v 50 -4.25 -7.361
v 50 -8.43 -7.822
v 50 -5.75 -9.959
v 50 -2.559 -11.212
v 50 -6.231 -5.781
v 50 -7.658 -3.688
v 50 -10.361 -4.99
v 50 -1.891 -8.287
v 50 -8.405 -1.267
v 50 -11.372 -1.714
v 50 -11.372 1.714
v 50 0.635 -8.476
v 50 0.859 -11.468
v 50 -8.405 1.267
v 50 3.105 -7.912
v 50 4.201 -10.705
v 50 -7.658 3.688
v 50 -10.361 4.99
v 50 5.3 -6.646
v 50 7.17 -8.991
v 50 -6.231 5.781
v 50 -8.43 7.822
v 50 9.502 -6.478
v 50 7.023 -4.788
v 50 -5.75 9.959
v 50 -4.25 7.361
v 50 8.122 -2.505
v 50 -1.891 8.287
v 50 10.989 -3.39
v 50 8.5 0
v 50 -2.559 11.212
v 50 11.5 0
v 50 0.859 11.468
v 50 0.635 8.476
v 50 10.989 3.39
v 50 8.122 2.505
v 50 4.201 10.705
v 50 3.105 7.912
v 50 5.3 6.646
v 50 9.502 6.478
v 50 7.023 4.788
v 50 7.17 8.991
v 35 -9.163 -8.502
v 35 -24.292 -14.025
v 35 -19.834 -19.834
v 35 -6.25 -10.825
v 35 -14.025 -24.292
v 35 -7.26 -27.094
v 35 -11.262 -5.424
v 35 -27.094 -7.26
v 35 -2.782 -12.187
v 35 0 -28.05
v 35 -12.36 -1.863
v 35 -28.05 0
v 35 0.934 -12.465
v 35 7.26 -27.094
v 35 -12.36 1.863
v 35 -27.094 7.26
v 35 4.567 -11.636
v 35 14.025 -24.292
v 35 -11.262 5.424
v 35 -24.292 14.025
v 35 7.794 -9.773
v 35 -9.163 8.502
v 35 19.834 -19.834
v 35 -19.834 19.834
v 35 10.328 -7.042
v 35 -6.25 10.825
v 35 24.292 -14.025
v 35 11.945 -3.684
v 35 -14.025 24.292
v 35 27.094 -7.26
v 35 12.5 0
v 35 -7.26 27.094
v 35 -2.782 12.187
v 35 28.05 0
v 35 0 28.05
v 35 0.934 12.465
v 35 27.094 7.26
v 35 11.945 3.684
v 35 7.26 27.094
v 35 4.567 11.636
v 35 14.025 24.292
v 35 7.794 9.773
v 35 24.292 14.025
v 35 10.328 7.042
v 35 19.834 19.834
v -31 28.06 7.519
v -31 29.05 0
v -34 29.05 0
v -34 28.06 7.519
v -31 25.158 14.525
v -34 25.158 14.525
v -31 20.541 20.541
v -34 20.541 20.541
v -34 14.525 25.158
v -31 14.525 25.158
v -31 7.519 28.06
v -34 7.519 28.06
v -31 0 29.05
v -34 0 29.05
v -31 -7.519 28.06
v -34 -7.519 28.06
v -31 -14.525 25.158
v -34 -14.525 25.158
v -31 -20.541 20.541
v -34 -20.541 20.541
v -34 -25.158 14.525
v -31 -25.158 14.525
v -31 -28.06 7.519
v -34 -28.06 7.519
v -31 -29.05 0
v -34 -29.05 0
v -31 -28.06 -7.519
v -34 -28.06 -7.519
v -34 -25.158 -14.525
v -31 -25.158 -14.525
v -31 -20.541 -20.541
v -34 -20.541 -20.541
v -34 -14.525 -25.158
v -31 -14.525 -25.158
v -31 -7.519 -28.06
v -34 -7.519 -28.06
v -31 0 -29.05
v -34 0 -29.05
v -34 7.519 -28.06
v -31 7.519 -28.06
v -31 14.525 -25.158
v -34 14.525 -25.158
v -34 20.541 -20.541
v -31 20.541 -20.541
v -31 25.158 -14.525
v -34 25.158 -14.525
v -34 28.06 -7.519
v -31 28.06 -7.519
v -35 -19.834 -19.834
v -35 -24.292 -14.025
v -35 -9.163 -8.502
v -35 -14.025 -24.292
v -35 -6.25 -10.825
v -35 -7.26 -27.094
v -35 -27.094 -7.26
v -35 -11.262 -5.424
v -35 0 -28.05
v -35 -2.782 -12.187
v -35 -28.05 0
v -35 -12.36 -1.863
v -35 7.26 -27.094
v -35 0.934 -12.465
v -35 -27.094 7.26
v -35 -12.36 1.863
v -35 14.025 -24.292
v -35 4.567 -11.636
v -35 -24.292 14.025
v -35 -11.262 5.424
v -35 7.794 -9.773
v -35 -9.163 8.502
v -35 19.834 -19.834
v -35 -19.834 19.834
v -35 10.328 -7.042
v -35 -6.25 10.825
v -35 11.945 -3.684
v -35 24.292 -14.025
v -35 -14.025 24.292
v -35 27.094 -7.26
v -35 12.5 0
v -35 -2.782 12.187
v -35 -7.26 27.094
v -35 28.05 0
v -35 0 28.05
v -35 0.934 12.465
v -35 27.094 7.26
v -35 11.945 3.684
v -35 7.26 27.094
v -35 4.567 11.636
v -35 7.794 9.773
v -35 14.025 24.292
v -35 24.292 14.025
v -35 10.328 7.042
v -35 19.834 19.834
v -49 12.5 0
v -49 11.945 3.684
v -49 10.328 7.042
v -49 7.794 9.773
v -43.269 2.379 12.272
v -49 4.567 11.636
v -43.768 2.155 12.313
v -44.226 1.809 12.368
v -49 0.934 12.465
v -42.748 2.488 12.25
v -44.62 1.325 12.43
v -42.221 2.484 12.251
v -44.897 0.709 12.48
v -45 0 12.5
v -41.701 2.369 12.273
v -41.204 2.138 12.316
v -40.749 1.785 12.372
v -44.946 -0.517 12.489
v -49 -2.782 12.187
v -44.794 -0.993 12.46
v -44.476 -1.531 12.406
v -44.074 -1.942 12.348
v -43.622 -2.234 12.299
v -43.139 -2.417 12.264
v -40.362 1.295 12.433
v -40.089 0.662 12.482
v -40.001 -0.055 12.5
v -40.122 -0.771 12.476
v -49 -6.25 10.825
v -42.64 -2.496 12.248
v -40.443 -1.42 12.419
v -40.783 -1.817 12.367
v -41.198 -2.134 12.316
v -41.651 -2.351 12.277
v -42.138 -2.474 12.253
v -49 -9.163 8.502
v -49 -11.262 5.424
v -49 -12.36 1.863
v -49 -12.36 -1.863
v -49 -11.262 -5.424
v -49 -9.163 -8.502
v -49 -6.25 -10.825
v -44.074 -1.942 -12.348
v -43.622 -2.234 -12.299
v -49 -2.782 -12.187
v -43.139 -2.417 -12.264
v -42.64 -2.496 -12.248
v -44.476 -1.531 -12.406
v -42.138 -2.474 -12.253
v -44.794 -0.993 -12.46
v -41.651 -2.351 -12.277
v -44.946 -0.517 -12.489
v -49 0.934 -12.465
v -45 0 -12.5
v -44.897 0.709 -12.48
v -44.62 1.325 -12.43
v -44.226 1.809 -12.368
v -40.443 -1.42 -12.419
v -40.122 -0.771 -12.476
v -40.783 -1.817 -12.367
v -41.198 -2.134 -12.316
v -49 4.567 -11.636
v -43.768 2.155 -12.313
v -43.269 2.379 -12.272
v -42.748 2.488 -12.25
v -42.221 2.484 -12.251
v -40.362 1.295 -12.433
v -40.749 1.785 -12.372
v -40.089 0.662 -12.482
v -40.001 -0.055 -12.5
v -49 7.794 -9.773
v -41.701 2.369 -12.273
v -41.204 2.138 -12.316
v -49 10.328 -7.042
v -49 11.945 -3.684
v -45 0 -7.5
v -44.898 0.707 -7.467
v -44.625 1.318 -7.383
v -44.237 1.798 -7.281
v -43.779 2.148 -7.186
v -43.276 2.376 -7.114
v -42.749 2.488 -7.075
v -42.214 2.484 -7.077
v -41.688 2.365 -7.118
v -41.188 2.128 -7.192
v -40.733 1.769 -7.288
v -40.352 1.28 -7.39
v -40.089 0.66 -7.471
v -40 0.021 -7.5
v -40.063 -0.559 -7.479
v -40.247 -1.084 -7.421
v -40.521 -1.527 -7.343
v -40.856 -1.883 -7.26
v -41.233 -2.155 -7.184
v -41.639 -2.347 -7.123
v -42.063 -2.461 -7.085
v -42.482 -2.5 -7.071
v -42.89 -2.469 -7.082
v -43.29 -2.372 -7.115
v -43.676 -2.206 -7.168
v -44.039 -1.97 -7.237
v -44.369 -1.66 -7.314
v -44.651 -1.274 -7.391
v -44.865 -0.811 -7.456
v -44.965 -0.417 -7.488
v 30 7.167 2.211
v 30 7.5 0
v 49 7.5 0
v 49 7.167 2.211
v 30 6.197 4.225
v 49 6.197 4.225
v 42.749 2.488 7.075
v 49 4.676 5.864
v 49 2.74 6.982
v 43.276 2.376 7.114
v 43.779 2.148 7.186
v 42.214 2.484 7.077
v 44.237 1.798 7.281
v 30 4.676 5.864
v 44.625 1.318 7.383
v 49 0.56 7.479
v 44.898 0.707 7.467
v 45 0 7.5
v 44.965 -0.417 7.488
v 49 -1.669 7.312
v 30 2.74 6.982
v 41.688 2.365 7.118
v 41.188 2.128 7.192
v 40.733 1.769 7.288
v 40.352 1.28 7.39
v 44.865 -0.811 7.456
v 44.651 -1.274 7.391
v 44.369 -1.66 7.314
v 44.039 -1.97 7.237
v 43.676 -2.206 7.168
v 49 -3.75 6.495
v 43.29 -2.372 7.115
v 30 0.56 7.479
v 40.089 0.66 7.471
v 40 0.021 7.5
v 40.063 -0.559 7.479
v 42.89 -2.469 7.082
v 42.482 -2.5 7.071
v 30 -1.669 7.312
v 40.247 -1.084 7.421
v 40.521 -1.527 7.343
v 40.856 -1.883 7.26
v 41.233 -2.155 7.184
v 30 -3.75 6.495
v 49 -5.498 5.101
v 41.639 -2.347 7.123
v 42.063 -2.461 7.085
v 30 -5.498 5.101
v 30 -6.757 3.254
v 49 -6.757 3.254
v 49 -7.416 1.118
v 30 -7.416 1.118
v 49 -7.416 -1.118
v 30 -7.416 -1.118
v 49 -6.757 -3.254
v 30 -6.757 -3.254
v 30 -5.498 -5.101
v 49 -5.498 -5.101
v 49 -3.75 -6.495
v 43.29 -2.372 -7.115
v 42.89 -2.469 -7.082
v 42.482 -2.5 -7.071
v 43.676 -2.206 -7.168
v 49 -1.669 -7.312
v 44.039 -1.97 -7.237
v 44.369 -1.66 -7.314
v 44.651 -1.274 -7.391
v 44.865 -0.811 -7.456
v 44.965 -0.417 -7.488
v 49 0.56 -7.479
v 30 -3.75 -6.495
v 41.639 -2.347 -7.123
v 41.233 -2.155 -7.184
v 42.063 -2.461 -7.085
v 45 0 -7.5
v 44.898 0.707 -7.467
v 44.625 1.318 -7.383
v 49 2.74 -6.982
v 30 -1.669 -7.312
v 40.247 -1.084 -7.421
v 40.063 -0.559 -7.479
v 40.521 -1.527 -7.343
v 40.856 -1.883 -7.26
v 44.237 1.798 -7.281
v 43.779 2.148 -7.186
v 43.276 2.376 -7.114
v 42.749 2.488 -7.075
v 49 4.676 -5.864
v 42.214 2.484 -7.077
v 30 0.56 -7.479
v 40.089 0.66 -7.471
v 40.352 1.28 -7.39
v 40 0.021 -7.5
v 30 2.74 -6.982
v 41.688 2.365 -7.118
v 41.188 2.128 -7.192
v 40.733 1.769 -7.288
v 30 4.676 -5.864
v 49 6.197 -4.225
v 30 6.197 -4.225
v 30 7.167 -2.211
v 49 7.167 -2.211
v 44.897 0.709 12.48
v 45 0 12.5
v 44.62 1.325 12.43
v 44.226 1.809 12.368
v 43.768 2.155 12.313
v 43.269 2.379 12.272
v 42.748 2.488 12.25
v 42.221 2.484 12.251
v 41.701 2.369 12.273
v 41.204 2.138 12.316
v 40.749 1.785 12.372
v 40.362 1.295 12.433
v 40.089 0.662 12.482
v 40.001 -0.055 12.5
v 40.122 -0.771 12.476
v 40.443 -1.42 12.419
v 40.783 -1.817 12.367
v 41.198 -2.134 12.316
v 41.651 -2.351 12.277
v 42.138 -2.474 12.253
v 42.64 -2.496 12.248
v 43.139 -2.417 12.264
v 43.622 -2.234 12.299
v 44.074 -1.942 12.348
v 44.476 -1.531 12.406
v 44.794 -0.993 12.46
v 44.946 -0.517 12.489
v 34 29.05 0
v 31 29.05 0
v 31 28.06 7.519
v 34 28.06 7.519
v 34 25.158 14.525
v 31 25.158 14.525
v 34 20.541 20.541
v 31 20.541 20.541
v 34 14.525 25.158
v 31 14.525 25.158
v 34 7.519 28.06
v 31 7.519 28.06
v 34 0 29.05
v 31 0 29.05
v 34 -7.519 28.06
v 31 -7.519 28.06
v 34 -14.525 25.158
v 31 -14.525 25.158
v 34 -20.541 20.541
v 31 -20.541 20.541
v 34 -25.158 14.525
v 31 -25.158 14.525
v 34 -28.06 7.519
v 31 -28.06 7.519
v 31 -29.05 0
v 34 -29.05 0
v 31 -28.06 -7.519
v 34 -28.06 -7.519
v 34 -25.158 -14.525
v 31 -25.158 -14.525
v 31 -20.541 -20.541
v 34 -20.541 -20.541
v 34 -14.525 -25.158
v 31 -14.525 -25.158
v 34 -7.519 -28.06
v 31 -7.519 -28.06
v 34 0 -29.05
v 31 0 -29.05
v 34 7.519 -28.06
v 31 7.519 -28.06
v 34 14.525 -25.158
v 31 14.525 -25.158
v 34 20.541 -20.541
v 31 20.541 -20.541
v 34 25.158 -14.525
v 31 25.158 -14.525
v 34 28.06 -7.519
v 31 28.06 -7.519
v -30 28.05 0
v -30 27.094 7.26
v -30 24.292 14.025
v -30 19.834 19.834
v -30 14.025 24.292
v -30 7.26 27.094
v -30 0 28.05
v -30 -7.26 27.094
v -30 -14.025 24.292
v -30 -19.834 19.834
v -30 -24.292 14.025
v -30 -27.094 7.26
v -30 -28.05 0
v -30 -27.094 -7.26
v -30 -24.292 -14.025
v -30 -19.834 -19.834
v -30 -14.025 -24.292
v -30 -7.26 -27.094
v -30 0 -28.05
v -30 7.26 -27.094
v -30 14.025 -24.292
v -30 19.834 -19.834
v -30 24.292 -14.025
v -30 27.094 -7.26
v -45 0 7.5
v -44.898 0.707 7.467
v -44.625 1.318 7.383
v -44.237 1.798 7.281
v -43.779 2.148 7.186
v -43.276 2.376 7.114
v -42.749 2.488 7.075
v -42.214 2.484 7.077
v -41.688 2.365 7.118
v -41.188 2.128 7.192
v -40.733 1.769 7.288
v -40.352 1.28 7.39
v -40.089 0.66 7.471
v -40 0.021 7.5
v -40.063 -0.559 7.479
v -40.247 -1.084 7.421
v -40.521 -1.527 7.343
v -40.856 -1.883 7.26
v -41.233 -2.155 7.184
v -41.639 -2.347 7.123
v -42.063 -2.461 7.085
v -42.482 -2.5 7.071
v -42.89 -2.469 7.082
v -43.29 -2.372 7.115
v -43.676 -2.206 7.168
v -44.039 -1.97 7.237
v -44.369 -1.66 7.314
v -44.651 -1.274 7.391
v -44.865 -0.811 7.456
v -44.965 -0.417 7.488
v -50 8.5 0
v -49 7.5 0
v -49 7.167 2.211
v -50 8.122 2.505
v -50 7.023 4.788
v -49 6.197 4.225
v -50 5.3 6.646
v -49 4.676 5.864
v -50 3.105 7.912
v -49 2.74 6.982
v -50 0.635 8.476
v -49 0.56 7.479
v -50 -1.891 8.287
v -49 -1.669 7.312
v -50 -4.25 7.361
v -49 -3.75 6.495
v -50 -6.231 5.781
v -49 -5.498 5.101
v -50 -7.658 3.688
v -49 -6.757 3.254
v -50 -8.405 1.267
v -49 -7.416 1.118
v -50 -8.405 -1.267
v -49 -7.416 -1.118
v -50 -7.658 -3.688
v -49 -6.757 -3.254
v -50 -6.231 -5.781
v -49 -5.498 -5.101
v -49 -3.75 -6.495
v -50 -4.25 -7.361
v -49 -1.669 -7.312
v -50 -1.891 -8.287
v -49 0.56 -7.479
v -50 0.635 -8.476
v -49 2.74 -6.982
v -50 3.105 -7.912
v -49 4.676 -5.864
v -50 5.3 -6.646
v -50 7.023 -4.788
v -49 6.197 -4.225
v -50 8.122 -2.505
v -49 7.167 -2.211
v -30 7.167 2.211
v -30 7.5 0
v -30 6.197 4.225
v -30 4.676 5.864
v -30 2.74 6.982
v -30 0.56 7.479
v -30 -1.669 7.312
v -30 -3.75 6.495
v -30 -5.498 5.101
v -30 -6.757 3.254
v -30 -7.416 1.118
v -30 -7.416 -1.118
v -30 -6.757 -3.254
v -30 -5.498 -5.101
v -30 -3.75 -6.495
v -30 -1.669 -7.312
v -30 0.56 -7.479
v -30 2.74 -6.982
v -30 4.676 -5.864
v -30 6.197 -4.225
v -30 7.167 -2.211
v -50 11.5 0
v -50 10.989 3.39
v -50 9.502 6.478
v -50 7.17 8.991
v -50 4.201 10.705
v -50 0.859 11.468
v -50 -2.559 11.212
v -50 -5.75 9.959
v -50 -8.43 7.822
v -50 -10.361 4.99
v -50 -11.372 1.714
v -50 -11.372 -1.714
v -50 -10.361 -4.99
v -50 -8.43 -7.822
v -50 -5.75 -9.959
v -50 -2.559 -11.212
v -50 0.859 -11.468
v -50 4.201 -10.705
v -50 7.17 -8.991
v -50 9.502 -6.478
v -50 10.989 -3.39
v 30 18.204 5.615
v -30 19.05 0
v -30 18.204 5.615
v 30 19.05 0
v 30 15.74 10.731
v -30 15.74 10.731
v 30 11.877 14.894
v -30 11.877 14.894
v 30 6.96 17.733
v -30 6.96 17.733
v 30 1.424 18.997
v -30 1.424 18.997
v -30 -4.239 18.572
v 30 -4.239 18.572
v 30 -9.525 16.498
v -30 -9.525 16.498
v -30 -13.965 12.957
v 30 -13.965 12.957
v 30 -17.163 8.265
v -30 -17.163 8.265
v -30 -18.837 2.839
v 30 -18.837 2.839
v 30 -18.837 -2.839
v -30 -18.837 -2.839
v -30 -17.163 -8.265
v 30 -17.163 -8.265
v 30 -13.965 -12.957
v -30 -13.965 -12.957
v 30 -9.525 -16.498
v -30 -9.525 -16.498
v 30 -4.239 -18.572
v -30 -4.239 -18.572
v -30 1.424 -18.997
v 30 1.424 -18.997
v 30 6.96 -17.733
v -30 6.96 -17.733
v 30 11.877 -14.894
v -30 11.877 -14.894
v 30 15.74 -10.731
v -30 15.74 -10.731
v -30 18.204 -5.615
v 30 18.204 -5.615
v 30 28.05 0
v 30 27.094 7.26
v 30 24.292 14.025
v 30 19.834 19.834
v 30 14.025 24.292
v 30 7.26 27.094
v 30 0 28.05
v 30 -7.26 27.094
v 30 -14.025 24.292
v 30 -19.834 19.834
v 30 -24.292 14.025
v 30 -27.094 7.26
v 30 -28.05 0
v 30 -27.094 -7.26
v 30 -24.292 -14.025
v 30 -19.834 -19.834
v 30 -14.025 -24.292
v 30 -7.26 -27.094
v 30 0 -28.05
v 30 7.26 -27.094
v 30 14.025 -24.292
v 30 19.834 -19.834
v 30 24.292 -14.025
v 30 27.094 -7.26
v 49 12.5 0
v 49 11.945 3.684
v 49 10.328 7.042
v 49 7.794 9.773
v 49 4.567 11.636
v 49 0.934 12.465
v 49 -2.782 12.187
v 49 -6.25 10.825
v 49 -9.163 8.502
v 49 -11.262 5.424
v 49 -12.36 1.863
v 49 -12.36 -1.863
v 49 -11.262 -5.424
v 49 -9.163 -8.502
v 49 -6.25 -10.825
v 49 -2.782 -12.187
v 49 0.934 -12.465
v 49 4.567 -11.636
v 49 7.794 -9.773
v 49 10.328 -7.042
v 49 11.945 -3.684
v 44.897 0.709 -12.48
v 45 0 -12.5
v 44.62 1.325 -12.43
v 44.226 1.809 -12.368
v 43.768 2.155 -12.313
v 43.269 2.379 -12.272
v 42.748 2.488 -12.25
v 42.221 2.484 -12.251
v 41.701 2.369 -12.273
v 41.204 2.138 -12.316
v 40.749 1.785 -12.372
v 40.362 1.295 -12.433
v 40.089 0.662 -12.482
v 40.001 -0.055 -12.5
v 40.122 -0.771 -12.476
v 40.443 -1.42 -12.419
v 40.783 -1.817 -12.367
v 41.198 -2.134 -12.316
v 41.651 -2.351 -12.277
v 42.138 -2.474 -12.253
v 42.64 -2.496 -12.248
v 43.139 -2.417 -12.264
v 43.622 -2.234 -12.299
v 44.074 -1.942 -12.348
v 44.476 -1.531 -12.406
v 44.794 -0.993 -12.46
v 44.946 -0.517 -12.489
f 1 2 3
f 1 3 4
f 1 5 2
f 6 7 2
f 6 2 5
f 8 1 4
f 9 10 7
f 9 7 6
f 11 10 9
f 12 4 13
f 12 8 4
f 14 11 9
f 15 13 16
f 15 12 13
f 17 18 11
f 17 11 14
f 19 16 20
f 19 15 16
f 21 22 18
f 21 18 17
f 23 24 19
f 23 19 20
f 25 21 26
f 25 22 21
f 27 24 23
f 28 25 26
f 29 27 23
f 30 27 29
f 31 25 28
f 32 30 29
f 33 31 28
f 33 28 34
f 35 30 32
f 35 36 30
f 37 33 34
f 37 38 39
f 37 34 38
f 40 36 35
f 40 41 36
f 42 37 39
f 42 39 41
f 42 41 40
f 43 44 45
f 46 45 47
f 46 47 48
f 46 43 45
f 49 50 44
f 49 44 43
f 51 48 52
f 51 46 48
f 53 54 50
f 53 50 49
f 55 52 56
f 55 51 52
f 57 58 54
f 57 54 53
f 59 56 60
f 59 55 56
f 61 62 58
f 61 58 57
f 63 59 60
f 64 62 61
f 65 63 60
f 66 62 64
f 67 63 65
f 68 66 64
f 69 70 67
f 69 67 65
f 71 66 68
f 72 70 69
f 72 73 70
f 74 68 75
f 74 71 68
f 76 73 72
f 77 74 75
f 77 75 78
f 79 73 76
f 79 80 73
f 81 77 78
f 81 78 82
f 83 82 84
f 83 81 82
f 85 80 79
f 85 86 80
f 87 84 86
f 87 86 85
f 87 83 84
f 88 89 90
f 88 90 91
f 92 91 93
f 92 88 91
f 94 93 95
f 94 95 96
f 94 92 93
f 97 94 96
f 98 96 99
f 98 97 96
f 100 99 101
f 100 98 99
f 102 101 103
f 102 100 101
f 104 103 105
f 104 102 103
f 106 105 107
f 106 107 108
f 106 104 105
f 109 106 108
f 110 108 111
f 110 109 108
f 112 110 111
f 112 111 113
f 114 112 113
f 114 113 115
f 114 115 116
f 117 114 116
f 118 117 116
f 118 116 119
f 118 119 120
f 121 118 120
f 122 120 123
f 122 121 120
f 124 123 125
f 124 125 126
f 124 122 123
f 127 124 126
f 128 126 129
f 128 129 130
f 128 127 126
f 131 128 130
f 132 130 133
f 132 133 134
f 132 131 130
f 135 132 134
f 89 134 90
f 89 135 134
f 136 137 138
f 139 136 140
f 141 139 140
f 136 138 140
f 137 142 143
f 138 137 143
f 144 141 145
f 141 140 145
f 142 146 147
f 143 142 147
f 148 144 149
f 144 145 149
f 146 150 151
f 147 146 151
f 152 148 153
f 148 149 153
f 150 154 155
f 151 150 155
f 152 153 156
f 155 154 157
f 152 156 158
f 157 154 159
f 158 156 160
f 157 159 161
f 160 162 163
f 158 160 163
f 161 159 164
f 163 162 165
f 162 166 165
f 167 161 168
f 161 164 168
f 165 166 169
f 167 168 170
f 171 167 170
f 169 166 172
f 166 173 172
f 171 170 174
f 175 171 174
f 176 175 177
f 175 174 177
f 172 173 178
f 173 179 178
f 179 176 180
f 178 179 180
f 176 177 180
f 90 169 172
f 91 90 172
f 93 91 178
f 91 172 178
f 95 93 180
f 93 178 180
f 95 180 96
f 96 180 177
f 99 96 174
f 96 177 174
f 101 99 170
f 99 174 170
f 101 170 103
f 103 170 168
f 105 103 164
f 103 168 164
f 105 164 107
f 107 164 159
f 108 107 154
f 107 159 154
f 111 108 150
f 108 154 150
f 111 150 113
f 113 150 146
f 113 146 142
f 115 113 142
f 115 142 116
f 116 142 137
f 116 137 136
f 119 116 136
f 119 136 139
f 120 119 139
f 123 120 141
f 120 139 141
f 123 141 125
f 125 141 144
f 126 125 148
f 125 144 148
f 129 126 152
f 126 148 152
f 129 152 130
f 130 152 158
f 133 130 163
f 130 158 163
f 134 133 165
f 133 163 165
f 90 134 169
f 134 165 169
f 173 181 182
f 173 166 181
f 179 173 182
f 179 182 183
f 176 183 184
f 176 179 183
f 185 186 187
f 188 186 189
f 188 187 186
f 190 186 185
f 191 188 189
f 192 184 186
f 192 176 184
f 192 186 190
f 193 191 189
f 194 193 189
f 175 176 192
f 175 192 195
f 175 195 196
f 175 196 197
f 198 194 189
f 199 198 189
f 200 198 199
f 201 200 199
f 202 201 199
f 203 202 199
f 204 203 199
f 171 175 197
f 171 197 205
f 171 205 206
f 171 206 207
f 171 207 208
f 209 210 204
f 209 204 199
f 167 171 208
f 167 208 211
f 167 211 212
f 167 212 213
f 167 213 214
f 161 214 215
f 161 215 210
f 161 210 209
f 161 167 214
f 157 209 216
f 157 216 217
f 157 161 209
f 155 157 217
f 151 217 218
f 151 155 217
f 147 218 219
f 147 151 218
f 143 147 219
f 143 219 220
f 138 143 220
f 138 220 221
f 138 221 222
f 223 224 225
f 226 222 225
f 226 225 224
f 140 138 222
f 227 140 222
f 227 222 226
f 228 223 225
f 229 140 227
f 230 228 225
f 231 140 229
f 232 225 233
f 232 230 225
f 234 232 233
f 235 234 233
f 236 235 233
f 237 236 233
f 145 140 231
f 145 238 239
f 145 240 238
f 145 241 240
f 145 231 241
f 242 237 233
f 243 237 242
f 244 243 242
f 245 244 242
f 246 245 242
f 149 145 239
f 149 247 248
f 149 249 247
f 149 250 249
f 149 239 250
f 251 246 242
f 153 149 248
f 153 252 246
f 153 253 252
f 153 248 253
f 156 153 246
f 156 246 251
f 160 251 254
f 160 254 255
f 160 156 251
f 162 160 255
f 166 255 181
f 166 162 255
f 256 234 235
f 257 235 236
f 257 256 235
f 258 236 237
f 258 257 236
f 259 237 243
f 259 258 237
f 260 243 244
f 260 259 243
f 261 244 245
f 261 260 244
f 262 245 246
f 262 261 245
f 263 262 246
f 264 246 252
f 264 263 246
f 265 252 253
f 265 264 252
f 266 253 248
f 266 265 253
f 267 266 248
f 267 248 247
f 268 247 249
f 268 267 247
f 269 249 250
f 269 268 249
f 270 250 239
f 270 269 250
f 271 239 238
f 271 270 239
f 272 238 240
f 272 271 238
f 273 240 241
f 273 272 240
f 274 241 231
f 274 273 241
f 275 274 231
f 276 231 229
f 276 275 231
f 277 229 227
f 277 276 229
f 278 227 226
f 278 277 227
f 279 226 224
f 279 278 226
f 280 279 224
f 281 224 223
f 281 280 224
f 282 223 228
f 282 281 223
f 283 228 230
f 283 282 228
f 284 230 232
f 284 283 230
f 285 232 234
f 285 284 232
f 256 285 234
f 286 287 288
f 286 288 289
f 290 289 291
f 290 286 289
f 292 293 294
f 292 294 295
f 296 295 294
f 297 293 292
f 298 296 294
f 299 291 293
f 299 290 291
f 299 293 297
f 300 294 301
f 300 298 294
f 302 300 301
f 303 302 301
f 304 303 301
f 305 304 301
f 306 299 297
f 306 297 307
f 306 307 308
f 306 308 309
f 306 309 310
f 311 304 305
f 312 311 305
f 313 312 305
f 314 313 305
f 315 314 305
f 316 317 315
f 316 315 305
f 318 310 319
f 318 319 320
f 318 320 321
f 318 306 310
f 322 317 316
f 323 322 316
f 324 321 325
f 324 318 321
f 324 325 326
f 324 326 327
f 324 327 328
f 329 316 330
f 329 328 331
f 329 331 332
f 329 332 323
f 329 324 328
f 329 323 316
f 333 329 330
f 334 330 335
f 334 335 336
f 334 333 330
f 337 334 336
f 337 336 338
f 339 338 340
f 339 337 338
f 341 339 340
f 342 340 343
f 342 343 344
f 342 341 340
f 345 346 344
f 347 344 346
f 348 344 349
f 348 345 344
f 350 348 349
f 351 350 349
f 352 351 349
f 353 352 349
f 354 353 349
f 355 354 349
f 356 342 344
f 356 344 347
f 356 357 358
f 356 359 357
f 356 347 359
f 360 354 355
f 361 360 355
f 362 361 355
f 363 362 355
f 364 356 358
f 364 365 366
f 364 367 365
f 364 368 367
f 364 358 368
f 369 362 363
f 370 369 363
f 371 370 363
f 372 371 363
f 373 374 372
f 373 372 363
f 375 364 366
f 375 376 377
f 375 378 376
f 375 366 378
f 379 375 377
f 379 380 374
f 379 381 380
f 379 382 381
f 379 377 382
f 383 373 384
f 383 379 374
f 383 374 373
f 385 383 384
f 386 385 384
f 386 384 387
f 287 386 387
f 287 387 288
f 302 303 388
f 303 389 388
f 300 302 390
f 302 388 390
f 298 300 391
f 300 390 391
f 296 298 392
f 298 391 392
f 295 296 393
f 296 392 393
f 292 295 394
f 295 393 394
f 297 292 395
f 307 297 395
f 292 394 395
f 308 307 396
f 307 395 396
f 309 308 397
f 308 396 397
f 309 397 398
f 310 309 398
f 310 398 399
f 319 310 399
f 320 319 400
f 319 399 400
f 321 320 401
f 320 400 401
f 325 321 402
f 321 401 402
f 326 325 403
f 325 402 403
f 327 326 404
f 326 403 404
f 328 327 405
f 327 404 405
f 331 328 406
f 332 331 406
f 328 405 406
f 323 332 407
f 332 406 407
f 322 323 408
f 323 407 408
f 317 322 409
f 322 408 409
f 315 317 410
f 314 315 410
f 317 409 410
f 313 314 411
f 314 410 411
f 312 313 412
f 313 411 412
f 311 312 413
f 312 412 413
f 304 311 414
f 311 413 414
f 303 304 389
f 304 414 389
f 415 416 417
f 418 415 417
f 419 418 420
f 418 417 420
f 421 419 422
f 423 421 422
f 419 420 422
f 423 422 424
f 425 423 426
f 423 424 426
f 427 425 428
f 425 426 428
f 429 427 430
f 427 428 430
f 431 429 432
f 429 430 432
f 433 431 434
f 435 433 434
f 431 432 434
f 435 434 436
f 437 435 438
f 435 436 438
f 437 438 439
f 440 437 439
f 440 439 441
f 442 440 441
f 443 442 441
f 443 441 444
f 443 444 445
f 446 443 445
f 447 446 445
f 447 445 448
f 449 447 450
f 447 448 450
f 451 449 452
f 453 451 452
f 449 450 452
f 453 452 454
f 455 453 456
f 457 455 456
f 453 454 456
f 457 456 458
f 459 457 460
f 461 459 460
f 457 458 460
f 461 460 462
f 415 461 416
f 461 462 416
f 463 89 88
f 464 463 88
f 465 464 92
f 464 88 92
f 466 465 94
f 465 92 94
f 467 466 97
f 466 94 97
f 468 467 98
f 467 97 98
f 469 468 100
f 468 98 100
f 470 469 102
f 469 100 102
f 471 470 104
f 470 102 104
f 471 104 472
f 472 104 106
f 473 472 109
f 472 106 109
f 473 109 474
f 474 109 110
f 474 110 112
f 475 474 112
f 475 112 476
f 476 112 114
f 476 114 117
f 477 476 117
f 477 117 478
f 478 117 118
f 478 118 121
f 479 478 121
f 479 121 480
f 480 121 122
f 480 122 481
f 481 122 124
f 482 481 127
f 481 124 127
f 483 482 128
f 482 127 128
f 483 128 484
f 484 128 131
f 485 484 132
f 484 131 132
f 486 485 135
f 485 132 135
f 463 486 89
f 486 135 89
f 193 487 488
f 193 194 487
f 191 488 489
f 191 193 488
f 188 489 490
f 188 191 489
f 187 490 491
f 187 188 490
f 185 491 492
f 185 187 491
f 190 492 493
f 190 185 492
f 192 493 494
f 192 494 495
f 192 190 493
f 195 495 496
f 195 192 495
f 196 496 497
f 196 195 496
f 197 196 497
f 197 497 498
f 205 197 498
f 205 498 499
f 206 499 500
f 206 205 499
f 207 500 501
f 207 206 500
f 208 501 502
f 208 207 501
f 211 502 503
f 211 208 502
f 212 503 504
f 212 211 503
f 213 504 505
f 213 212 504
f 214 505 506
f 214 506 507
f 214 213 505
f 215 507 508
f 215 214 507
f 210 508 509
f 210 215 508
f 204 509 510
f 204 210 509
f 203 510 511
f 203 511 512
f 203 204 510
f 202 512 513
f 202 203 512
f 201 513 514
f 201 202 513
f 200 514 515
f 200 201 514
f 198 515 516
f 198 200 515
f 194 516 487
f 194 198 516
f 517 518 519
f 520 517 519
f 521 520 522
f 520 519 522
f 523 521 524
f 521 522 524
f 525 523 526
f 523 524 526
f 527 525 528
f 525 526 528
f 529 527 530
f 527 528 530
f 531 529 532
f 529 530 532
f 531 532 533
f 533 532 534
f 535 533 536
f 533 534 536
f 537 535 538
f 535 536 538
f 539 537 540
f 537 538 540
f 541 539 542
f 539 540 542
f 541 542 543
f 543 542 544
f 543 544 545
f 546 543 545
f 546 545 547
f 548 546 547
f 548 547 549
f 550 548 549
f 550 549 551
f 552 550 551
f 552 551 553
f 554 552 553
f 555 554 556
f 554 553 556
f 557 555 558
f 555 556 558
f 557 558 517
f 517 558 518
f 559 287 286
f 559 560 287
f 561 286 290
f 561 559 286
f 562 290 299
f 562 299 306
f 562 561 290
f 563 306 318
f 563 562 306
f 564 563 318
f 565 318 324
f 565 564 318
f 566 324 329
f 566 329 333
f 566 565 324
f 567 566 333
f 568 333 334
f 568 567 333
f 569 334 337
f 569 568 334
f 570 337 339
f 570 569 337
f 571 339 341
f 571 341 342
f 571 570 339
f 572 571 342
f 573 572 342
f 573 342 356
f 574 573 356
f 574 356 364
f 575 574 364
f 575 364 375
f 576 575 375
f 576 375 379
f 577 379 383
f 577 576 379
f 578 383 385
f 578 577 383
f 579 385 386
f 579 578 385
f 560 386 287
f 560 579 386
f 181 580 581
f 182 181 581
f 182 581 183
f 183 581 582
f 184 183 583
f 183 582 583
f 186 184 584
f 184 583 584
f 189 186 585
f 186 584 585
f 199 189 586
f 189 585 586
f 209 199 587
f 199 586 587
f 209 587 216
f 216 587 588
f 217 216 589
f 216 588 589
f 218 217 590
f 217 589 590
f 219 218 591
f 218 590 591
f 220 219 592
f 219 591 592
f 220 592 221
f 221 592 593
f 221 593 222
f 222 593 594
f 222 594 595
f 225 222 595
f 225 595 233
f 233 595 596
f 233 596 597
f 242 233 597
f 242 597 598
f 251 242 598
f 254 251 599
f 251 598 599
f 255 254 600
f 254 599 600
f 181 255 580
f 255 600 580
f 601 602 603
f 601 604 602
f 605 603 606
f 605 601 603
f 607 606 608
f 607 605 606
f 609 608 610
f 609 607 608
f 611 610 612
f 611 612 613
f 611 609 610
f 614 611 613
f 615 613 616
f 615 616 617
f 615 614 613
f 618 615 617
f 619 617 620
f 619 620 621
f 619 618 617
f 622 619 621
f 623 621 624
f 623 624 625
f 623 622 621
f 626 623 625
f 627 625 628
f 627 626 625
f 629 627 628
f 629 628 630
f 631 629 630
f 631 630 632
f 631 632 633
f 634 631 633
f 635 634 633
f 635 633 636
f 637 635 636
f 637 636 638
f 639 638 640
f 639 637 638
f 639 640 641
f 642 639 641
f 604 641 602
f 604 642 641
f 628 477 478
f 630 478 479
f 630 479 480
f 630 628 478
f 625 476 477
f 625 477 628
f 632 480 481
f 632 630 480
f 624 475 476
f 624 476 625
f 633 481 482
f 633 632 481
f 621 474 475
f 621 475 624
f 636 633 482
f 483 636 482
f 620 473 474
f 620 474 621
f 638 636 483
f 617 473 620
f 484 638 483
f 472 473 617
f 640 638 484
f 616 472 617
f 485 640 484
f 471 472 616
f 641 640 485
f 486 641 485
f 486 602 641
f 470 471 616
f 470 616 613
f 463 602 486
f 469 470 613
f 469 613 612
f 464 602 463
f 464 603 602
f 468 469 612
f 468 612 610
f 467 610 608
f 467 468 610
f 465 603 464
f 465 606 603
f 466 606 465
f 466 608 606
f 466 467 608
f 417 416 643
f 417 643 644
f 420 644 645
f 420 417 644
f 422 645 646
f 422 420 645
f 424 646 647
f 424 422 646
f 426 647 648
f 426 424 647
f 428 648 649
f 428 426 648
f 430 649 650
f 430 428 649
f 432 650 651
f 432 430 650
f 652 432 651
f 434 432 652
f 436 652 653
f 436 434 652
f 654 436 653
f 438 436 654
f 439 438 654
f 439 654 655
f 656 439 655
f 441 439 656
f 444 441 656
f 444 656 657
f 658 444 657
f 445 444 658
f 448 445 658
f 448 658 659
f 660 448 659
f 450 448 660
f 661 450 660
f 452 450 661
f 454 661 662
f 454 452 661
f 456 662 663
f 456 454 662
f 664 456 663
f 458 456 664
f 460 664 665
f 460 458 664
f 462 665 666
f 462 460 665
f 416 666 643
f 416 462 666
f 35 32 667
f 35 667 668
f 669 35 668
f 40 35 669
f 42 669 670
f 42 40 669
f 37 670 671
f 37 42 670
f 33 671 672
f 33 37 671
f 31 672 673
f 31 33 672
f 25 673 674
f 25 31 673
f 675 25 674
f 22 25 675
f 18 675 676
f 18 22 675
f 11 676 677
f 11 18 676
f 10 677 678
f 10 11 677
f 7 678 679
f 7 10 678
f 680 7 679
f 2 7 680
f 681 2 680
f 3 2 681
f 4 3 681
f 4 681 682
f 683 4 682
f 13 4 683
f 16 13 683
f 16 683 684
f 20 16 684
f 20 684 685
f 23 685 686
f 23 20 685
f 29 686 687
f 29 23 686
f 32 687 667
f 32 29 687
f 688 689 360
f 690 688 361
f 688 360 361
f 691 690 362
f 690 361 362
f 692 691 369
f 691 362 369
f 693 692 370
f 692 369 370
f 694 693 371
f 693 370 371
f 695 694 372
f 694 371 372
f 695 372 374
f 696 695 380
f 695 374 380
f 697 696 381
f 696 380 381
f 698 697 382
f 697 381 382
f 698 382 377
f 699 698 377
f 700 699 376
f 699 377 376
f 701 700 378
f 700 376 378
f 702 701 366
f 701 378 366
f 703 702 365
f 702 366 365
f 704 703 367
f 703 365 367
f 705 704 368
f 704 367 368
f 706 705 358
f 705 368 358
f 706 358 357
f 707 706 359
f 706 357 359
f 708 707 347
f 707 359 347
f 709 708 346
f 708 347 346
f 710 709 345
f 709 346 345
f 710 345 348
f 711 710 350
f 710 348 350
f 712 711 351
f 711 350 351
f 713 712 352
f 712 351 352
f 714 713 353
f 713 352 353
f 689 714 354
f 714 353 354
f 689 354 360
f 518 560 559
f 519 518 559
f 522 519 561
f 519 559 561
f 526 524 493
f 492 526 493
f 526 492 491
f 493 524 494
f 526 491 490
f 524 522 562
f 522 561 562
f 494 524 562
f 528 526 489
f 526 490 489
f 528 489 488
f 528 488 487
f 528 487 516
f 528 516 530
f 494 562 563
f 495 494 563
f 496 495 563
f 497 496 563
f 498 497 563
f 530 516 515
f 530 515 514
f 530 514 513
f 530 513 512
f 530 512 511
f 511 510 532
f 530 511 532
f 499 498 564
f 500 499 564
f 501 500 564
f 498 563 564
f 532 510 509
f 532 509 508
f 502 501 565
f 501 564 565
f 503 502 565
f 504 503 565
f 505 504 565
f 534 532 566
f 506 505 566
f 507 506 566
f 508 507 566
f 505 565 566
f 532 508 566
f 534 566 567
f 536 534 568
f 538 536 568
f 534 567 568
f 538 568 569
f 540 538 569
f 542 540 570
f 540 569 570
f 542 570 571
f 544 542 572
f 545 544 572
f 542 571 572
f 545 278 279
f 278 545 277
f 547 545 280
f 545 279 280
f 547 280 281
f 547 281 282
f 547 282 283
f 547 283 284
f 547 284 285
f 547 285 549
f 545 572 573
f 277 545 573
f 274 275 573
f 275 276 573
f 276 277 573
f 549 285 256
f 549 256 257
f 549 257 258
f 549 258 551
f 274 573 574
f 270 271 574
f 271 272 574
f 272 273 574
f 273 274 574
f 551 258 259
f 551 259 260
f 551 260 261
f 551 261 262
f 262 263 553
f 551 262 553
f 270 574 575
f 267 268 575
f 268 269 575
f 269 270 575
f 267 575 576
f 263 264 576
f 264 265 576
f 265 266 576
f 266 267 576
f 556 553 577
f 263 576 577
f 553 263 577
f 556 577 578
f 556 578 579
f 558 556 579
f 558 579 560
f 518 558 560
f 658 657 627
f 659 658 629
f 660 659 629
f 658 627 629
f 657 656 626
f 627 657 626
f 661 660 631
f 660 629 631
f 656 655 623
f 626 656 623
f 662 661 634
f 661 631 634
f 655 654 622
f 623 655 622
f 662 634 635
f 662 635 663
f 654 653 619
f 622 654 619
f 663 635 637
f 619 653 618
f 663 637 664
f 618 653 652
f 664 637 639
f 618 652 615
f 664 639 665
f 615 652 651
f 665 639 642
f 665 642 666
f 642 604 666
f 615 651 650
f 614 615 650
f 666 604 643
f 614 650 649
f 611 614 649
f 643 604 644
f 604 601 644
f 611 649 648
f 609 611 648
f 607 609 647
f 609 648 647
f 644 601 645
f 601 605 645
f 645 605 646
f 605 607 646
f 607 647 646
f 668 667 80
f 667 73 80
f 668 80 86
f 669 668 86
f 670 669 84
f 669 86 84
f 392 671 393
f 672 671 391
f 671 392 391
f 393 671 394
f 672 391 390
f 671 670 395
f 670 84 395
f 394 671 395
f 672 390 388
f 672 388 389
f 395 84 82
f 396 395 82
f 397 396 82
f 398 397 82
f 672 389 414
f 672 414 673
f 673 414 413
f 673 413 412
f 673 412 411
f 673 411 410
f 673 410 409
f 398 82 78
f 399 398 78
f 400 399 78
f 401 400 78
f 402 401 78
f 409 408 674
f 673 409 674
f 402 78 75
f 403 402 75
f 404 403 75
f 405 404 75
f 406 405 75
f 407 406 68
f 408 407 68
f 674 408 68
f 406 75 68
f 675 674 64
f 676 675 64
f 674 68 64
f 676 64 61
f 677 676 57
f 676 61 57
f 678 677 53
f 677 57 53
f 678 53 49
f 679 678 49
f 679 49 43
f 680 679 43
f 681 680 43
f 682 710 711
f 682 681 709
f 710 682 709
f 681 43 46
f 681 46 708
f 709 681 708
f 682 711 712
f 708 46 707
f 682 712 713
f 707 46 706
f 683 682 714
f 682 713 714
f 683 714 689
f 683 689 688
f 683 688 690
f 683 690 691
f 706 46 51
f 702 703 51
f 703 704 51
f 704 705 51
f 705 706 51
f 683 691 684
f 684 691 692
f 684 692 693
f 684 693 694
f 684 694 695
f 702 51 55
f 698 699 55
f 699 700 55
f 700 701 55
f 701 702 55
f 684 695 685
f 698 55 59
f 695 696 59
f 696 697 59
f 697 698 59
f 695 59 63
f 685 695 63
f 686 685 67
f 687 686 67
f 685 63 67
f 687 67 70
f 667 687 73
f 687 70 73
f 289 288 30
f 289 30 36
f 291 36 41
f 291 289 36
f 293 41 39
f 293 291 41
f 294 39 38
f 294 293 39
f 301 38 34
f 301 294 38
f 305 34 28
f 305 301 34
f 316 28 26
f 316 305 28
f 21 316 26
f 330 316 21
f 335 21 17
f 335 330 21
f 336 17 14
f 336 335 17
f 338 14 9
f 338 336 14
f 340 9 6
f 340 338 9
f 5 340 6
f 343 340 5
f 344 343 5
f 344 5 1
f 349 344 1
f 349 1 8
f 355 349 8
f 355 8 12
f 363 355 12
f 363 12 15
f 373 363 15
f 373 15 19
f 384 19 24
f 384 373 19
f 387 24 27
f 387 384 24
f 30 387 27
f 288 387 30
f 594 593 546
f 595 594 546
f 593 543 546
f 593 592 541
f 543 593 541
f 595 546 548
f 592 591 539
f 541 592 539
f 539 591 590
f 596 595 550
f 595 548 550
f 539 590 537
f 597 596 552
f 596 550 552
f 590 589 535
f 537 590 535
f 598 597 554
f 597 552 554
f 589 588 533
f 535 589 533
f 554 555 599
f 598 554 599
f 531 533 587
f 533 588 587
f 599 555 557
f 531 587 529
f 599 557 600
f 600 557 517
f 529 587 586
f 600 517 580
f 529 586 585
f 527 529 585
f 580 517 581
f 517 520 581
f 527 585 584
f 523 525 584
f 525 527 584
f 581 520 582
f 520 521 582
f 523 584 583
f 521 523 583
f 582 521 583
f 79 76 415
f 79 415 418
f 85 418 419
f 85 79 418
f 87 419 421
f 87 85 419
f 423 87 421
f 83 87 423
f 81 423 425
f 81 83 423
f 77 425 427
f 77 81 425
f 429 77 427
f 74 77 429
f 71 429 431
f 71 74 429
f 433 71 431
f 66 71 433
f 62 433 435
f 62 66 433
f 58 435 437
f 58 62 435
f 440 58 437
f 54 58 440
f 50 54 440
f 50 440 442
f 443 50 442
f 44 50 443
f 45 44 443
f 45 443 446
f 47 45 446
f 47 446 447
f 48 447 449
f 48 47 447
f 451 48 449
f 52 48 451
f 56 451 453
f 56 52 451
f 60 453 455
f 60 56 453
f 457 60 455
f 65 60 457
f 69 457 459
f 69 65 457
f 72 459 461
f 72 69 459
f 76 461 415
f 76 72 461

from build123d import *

# Parameters (mm, degrees)
F0_R     = 19.05
F0_R_2   = 7.5
F1_DEPTH = 30
F2_R     = 29.05
F2_R_2   = 7.5
F3_DEPTH = 5
F4_R     = 12.5
F4_R_2   = 7.5
F5_DEPTH = 15
F6_SIZE  = 1
F7_R     = 2.5
F8_DEPTH = 25


with BuildPart() as f1:
    # F0 (on Right) → F1 (new body, symmetric)
    with BuildSketch(Plane.YZ):
        Circle(F0_R)
        Circle(F0_R_2, mode=Mode.SUBTRACT)
    extrude(amount=F1_DEPTH, both=True)

    # F2 (on face) → F3 (join)
    with BuildSketch(Plane.YZ.offset(30)):
        Circle(F2_R)
        Circle(F2_R_2, mode=Mode.SUBTRACT)
    extrude(amount=F3_DEPTH)

    # F4 (on face) → F5 (join)
    with BuildSketch(Plane.YZ.offset(35)):
        Circle(F4_R)
        Circle(F4_R_2, mode=Mode.SUBTRACT)
    extrude(amount=F5_DEPTH)

    # F6
    f6_edges = [f1.edges().sort_by_distance(p)[0] for p in [
        (35, -29.05, 0),
        (30, -29.05, 0),
        (50, -12.5, 0),
        (50, -7.5, 0),
    ]]
    chamfer(f6_edges, length=F6_SIZE)

    # F7 (on Top) → F8 (cut, symmetric)
    with BuildSketch(Plane.XY):
        with Locations((42.5, 0)):
            Circle(F7_R)
    extrude(amount=F8_DEPTH, both=True, mode=Mode.SUBTRACT)

    # F9: F1 across plane


with BuildPart() as f1_1:
    add(f1.part)
    add(f1.part.mirror(Plane.YZ))


solid = f1_1.part
